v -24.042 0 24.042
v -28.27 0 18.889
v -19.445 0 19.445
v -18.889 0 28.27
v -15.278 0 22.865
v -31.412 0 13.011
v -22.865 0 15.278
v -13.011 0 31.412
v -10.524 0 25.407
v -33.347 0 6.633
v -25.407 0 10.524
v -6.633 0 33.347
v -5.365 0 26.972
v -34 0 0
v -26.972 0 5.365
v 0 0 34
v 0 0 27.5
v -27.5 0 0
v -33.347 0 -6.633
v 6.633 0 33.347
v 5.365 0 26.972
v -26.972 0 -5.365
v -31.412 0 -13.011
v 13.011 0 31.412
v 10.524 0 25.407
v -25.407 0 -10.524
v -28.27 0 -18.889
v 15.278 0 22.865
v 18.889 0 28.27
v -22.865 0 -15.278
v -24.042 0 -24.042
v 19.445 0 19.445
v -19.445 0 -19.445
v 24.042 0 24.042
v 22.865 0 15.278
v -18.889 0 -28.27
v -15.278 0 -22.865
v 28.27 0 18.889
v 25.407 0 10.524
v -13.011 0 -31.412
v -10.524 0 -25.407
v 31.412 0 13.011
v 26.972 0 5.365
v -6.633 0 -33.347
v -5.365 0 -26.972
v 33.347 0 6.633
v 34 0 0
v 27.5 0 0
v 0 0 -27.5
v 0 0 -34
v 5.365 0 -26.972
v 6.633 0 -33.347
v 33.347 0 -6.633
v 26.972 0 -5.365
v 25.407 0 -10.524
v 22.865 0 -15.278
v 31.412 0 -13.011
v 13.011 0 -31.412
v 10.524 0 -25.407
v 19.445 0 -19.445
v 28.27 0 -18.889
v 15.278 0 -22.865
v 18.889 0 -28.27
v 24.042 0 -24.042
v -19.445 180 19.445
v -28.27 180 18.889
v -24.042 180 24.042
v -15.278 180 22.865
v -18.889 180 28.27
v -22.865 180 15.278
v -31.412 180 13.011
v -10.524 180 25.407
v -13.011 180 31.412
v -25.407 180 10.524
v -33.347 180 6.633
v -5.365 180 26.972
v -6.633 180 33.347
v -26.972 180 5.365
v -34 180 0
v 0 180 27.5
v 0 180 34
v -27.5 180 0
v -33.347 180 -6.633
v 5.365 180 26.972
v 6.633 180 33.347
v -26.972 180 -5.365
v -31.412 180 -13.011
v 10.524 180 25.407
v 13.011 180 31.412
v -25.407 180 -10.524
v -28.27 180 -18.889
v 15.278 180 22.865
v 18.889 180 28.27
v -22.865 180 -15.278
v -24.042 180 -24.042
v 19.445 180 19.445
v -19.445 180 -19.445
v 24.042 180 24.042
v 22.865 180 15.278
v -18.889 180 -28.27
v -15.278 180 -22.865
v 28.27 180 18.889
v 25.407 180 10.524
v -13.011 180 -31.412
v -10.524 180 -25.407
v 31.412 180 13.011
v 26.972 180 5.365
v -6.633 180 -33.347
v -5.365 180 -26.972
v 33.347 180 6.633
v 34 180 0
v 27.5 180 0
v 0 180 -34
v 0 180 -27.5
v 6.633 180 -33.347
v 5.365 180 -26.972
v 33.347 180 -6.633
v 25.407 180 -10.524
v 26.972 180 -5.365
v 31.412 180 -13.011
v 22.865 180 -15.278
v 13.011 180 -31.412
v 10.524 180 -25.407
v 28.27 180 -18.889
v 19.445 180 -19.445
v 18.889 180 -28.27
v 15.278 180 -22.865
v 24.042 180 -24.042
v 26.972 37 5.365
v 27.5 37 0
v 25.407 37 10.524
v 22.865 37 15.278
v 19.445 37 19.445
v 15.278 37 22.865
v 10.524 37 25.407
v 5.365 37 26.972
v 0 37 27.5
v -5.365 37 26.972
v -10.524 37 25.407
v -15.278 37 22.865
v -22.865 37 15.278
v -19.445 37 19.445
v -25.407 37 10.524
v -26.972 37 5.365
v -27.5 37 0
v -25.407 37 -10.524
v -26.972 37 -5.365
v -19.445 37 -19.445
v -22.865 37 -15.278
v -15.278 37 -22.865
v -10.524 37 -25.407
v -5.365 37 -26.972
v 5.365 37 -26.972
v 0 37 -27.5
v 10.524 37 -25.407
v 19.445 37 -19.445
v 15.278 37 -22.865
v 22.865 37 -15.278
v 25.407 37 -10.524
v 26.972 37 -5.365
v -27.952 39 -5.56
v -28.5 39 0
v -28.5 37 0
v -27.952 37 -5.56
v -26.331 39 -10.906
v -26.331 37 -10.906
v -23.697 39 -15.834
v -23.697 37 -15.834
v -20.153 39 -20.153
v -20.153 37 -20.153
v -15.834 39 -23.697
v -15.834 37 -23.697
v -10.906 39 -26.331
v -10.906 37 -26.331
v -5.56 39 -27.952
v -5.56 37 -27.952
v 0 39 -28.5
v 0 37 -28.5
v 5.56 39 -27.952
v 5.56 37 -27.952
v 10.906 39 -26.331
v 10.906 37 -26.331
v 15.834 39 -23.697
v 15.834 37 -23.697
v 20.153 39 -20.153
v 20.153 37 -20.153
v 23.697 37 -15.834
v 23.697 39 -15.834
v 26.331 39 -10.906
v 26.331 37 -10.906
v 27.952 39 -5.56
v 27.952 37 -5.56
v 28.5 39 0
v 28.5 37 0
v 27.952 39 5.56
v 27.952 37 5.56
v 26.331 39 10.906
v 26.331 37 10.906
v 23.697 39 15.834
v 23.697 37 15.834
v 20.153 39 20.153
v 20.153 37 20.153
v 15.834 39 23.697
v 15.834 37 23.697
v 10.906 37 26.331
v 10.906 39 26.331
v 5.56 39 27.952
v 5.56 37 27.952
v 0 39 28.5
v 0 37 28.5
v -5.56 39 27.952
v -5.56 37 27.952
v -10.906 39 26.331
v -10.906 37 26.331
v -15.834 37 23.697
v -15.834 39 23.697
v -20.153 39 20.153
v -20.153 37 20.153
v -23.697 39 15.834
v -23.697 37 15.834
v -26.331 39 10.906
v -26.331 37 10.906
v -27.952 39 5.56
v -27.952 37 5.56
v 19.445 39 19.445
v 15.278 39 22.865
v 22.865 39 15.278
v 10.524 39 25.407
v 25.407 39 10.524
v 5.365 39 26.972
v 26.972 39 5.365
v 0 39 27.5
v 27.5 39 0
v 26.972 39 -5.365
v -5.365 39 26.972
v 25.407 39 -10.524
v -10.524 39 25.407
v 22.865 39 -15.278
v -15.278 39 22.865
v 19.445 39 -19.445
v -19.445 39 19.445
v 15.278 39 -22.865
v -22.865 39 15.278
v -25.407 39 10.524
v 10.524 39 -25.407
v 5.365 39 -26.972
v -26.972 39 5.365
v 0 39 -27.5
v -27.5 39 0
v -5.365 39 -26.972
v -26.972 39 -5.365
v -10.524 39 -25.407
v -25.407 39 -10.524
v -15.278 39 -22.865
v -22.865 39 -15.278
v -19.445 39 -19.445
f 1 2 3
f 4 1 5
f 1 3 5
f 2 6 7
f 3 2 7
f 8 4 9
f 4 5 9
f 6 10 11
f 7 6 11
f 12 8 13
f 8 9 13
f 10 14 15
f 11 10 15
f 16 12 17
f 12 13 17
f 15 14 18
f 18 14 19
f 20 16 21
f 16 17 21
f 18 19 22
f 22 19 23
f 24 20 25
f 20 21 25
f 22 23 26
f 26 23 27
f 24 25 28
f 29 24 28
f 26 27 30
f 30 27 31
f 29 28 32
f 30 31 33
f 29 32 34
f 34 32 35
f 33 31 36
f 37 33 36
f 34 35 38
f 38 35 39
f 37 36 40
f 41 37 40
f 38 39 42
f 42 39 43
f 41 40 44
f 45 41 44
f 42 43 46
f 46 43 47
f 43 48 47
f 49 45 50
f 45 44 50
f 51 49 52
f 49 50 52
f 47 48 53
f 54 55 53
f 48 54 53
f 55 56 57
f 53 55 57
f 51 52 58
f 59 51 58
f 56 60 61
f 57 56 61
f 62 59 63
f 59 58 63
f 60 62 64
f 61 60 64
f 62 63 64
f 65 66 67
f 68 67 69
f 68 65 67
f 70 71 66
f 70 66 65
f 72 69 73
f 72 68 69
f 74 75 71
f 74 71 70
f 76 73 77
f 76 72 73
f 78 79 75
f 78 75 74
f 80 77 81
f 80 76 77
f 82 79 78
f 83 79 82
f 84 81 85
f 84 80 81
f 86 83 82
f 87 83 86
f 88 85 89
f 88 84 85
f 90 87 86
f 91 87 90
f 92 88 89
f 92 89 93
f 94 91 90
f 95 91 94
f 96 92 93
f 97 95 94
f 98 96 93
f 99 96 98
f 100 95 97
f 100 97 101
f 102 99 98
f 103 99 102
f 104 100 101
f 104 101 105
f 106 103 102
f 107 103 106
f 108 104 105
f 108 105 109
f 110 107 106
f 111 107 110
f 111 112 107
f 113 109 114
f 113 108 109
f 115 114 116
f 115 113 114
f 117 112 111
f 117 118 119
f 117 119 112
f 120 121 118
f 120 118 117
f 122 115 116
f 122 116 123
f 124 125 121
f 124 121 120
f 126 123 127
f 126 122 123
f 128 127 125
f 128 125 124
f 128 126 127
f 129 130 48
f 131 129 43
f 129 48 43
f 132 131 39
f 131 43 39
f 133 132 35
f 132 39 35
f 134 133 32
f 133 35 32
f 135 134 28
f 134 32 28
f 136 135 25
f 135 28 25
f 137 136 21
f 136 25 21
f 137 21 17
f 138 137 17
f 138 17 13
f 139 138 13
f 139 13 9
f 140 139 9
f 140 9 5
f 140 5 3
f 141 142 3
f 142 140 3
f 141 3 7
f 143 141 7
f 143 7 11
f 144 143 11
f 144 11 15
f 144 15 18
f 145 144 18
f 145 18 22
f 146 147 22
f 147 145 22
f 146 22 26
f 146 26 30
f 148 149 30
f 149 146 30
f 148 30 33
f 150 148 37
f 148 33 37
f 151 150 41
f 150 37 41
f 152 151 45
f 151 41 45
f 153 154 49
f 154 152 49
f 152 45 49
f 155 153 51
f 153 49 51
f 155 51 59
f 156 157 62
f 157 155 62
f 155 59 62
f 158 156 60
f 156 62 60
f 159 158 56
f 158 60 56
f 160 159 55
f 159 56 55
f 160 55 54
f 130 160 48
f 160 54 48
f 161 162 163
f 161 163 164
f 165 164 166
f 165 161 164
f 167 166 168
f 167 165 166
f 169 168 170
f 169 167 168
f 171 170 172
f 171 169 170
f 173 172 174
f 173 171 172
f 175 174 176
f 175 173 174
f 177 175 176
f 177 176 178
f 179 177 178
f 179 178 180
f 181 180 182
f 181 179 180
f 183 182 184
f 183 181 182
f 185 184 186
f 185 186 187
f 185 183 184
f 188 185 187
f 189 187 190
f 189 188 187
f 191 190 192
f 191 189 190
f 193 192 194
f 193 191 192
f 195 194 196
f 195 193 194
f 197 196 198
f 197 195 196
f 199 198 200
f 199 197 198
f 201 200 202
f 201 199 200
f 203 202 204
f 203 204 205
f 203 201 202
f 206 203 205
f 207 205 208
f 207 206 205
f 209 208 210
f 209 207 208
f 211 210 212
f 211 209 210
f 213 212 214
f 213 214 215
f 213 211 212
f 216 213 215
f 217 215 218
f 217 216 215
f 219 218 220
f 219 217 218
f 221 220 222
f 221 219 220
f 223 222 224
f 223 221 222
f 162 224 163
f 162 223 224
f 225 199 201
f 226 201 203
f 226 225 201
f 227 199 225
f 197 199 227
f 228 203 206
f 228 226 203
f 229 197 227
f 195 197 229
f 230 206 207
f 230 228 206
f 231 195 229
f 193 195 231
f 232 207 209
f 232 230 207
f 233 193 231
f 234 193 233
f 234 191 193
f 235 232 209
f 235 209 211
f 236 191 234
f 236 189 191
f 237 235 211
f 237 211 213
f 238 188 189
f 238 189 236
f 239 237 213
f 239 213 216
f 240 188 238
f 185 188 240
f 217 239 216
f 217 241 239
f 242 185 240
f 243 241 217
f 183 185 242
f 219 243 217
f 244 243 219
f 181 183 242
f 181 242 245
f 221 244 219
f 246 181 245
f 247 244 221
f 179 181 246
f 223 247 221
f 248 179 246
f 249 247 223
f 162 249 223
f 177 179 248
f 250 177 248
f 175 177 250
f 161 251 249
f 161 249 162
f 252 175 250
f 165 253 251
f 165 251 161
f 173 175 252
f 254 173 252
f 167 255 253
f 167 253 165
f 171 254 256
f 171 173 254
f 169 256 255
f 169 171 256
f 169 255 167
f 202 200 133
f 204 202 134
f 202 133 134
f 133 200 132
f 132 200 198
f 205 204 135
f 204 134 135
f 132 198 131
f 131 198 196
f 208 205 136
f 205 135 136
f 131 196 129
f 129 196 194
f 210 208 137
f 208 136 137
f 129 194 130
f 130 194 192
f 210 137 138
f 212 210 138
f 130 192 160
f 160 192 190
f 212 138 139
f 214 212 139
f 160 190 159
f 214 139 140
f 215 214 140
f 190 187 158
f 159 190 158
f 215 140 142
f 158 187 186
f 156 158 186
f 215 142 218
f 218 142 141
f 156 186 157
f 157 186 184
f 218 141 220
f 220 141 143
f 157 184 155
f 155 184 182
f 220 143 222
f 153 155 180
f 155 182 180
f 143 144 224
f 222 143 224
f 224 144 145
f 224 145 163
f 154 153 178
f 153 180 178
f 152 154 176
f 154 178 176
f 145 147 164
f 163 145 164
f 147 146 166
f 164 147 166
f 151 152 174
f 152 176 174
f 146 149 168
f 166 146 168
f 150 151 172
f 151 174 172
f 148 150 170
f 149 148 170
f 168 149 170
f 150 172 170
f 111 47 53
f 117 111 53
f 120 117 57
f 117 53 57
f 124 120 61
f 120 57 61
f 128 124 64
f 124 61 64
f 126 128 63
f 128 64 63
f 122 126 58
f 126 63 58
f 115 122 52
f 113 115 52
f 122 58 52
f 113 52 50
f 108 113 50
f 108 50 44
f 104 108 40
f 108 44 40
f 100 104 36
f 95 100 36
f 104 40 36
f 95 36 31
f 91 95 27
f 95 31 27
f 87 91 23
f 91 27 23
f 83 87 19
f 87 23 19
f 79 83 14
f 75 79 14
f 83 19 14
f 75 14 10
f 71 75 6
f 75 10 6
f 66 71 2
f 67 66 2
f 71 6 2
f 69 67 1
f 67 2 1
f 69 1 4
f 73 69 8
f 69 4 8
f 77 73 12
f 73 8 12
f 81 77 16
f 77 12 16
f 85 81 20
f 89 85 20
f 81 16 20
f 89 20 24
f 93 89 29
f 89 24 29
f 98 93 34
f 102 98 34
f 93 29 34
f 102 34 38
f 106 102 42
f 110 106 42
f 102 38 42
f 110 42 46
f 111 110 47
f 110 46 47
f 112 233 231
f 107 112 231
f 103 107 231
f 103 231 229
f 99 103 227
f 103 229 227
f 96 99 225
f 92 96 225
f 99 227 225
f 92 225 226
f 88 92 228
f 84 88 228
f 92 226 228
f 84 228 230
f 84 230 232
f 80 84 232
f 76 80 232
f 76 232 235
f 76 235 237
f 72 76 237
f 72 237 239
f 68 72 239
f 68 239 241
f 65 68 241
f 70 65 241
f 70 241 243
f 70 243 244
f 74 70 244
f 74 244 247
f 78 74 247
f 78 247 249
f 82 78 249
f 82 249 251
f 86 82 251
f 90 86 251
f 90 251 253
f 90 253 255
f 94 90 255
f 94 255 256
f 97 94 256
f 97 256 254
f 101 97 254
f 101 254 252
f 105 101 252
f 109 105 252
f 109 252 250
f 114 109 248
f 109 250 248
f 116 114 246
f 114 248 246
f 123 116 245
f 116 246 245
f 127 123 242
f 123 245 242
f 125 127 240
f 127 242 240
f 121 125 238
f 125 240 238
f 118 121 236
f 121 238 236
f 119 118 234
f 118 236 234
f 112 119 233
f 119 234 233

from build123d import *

# Parameters (mm, degrees)
SKETCH1_R           = 34
BOSS_EXTRUDE1_DEPTH = 180
SKETCH2_R           = 27.5
CUT_EXTRUDE1_DEPTH  = 181
SKETCH3_R           = 28.5
SKETCH3_R_2         = 27.5
CUT_EXTRUDE2_DEPTH  = 2


with BuildPart() as part:
    # Sketch1 → Boss-Extrude1 (new body)
    with BuildSketch(Plane(origin=(0, 0, 0), x_dir=(1, 0, 0), z_dir=(0, 1, 0))):
        Circle(SKETCH1_R)
    extrude(amount=BOSS_EXTRUDE1_DEPTH)

    # Sketch2 → Cut-Extrude1 (cut, through all)
    with BuildSketch(Plane.XZ):
        Circle(SKETCH2_R)
    extrude(amount=-CUT_EXTRUDE1_DEPTH, mode=Mode.SUBTRACT)

    # Sketch3 → Cut-Extrude2 (cut)
    with BuildSketch(Plane(origin=(0, 39, 0), x_dir=(-1, 0, 0), z_dir=(0, -1, 0))):
        Circle(SKETCH3_R)
        Circle(SKETCH3_R_2, mode=Mode.SUBTRACT)
    extrude(amount=CUT_EXTRUDE2_DEPTH, mode=Mode.SUBTRACT)


solid = part.part
